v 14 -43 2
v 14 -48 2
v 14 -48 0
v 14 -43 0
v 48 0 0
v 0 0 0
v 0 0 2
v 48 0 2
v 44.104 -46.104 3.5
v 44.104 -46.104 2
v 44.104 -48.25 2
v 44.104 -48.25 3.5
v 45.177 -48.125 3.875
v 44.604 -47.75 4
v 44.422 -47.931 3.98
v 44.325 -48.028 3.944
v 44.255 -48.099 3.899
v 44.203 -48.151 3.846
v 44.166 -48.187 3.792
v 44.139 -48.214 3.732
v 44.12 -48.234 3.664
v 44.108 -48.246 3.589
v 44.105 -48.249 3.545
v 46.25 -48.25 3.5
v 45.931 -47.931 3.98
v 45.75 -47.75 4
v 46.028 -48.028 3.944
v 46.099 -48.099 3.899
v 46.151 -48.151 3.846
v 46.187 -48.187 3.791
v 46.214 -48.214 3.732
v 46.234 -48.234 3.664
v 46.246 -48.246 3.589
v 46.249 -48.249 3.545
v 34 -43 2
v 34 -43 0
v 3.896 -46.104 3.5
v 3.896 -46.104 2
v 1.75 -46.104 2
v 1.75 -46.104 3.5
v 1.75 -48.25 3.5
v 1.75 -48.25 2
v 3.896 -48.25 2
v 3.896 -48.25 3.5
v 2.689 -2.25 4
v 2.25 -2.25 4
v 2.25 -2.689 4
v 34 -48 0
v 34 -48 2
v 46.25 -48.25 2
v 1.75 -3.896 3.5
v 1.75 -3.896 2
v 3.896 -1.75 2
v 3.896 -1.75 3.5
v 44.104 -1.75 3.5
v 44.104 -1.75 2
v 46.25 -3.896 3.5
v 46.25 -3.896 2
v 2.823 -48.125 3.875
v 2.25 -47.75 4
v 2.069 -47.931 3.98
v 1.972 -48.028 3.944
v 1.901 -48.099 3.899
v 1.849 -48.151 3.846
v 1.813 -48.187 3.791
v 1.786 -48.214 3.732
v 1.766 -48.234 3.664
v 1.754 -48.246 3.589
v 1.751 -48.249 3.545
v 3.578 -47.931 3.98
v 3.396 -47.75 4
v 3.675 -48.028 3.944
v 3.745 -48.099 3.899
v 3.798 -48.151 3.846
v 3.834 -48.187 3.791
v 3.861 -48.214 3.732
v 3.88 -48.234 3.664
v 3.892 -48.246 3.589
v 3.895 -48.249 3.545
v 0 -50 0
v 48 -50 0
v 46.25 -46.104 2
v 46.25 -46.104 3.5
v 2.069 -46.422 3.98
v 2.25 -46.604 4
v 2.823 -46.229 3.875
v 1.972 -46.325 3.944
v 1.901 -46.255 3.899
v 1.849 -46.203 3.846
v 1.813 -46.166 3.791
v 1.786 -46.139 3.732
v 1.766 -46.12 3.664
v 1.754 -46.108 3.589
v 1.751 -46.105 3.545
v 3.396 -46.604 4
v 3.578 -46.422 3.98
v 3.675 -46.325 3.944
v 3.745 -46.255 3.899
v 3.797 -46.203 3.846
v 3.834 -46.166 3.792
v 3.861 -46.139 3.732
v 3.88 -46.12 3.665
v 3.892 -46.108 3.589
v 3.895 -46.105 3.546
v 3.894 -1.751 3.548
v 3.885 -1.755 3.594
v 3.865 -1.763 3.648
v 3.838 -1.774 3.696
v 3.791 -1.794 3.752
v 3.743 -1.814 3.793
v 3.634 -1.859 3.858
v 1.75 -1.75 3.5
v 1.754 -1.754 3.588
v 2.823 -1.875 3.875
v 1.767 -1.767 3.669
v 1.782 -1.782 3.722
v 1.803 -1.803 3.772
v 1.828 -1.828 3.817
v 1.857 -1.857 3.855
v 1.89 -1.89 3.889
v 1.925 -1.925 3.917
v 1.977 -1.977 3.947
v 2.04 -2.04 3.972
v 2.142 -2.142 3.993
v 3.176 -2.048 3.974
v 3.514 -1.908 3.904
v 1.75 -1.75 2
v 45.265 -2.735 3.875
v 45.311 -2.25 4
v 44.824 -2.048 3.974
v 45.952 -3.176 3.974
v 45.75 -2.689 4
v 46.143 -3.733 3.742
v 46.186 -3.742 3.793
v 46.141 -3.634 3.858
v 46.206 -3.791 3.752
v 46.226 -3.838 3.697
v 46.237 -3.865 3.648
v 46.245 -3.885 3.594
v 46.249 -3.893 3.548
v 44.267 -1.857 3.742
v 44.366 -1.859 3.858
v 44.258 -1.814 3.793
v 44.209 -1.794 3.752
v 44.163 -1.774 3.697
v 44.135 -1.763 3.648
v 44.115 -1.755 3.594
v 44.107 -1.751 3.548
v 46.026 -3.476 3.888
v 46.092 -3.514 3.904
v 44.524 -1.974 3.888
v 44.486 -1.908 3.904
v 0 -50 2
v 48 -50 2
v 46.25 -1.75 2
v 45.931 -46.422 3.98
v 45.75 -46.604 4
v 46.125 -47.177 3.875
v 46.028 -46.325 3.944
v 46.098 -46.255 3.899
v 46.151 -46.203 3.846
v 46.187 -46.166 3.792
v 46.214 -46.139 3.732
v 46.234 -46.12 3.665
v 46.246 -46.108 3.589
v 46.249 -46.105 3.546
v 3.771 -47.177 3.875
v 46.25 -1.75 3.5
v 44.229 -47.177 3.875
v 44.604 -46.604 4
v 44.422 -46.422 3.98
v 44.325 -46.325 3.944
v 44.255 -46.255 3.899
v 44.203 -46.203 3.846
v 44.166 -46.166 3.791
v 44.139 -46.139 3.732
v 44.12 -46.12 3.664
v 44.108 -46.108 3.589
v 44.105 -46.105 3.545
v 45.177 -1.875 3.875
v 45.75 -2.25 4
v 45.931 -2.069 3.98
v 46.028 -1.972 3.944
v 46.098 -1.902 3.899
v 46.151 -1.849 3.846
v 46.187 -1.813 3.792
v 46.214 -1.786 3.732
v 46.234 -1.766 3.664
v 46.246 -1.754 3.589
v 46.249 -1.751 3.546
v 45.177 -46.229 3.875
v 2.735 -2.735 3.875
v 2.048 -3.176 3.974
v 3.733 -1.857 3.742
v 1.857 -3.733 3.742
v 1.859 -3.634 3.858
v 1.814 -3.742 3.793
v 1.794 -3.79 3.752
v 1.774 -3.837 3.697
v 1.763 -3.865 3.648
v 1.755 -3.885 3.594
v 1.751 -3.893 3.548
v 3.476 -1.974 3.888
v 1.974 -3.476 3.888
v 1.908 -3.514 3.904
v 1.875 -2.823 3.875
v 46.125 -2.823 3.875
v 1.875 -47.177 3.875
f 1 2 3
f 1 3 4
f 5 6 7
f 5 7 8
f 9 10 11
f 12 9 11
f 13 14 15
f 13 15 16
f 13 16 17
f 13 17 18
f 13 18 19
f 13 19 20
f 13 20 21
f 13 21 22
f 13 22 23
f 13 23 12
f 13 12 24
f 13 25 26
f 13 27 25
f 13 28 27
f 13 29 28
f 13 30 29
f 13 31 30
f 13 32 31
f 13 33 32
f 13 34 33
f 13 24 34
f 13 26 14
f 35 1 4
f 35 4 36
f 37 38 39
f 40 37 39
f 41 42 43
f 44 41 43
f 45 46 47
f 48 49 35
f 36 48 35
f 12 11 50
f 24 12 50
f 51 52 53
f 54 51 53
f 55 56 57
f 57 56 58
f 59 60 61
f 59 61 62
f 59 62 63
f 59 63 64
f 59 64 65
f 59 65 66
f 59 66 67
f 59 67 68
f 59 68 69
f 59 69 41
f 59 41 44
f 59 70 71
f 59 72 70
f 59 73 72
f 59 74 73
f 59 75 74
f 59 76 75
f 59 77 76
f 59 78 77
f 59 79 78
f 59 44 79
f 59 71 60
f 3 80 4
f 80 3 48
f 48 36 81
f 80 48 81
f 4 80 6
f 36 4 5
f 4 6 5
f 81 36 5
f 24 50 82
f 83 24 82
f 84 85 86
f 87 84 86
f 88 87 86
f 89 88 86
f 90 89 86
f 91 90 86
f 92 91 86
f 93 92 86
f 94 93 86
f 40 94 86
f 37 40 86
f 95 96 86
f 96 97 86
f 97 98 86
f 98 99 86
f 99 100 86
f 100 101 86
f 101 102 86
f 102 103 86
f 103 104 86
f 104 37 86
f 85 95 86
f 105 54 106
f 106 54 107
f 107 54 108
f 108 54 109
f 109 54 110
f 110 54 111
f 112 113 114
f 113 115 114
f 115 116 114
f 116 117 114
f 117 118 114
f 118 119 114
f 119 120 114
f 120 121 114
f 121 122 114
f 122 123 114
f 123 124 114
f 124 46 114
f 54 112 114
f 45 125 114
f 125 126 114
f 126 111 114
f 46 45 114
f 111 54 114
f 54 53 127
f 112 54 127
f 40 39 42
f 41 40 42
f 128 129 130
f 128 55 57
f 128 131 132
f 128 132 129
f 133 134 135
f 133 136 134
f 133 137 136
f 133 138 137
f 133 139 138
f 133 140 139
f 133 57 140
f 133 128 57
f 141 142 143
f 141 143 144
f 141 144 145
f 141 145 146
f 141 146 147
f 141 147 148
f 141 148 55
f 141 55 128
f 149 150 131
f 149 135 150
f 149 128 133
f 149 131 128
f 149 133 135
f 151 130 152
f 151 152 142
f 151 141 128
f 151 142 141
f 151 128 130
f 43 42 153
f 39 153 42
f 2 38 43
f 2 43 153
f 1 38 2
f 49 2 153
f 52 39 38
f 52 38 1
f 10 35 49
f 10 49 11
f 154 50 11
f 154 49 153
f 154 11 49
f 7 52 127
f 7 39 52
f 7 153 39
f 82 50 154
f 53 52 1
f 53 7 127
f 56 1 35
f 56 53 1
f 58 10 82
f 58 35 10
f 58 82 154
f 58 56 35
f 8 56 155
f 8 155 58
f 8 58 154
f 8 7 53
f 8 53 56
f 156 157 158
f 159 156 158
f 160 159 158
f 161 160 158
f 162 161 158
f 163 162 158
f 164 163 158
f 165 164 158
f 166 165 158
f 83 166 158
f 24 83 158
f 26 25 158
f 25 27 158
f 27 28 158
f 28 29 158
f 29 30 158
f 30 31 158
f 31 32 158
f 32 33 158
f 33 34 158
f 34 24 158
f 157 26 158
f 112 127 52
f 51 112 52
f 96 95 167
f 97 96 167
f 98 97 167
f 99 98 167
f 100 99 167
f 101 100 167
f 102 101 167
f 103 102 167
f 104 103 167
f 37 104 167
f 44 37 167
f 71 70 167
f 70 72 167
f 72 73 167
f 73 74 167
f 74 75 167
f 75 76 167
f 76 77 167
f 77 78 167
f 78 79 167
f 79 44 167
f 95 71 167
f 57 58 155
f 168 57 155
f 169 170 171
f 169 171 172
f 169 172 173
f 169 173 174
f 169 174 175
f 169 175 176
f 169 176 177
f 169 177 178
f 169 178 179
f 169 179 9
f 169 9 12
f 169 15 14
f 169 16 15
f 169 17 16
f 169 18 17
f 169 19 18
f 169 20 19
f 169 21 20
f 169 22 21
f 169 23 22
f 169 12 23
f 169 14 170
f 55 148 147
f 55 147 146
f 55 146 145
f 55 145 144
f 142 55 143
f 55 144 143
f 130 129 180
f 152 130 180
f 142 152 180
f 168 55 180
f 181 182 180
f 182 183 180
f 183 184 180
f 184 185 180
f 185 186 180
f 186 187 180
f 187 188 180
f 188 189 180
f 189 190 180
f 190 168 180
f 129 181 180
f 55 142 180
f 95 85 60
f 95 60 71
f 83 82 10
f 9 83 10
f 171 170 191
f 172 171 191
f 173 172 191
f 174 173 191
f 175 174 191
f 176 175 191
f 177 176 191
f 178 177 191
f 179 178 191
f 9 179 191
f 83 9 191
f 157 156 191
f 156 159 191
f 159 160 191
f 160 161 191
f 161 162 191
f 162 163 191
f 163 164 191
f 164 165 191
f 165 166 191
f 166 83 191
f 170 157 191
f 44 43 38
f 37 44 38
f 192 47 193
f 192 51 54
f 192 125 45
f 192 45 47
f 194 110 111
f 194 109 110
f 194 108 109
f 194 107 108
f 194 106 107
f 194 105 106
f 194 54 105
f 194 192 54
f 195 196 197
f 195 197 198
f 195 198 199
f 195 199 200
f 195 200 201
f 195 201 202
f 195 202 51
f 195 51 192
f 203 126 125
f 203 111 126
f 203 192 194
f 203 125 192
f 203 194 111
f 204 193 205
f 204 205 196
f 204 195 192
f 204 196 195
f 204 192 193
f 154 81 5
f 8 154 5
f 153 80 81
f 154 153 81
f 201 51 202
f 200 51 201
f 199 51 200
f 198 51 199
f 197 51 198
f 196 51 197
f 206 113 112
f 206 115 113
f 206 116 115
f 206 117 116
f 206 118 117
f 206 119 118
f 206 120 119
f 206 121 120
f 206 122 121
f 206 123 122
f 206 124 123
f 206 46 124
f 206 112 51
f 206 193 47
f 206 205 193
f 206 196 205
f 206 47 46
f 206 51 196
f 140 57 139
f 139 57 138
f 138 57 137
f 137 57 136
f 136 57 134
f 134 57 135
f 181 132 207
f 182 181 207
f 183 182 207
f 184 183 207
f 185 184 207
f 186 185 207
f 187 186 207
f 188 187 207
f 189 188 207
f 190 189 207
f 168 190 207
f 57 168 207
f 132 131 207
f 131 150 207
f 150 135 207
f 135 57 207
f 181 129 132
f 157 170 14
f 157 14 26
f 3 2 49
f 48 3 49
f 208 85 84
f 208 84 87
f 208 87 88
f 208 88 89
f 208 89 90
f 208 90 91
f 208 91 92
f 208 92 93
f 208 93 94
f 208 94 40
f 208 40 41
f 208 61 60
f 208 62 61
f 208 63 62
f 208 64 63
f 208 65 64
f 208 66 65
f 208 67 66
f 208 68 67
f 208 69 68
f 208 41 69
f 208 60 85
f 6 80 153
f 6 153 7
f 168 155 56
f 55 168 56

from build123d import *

# Parameters (mm, degrees)
F0_W         = 48
F0_H         = 50
F1_DEPTH     = 2
F3_DEPTH     = 2
F4_W         = 20
F4_H         = 5
F5_DEPTH     = 25
F6_T1_DEPTH  = 4.6464466094
F6_T3_DEPTH  = 4.6464466094
F6_T5_DEPTH  = 4.6464466094
F6_T7_DEPTH  = 5.5355339059
F6_T9_DEPTH  = 5.5355339059
F6_T11_DEPTH = 4.6464466094


# Not quite as in the source:
# - a fillet or chamfer that OpenCascade refuses, or shapes differently, is made with other operations: its cross-section is extruded or revolved along the edge and cut away or added
# - a feature names something its author has since deleted; it is built from what else it names


with BuildPart() as f1:
    # F0 (on Top) → F1 (new body)
    with BuildSketch(Plane.XY):
        with Locations((24, -25)):
            Rectangle(F0_W, F0_H)
    extrude(amount=F1_DEPTH)

    # F2 (on face) → F3 (join)
    with BuildSketch(Plane.XY.offset(2)):
        Polygon((1.75, -1.75), (1.75, -3.8964466094), (3.8964466094, -1.75), align=None)
        Polygon((44.1035533906, -1.75), (46.25, -3.8964466094), (46.25, -1.75), align=None)
        Polygon((46.25, -48.25), (46.25, -46.1035533906), (44.1035533906, -48.25), align=None)
        Polygon((3.8964466094, -48.25), (1.75, -46.1035533906), (1.75, -48.25), align=None)
        Polygon((3.8964466094, -46.1035533906), (1.75, -46.1035533906), (3.8964466094, -48.25), align=None)
        Polygon((44.1035533906, -48.25), (46.25, -46.1035533906), (44.1035533906, -46.1035533906), align=None)
    extrude(amount=F3_DEPTH)

    # F4 (on face) → F5 (cut)
    with BuildSketch(Plane.XY.offset(2)):
        with Locations((24, -45.5)):
            Rectangle(F4_W, F4_H)
    extrude(amount=-F5_DEPTH, mode=Mode.SUBTRACT)

    # F6: fillet of radius 0.5 on 14 edges, made by hand

    # F6_s2 → F6_t1 (cut)
    with BuildSketch(Plane.XZ.offset(44.8535533906)):
        with BuildLine():
            add(Edge.make_bspline(
                [(1.75, 3.5), (1.75, 4), (2.25, 4)],
                knots=[0, 0, 0, 1, 1, 1], degree=2, weights=[1, 1, 1]))
            Line((2.25, 4), (1.75, 4))
            Line((1.75, 4), (1.75, 3.5))
        make_face()
        with BuildLine():
            add(Edge.make_bspline(
                [(3.8964466094, 3.5), (3.8964466094, 4), (3.3964466094, 4)],
                knots=[0, 0, 0, 1, 1, 1], degree=2, weights=[1, 1, 1]))
            Line((3.3964466094, 4), (3.8964466094, 4))
            Line((3.8964466094, 4), (3.8964466094, 3.5))
        make_face()
        with BuildLine():
            add(Edge.make_bspline(
                [(46.25, 3.5), (46.25, 4), (45.75, 4)],
                knots=[0, 0, 0, 1, 1, 1], degree=2, weights=[1, 1, 1]))
            Line((45.75, 4), (46.25, 4))
            Line((46.25, 4), (46.25, 3.5))
        make_face()
        with BuildLine():
            add(Edge.make_bspline(
                [(44.1035533906, 3.5), (44.1035533906, 4), (44.6035533906, 4)],
                knots=[0, 0, 0, 1, 1, 1], degree=2, weights=[1, 1, 1]))
            Line((44.6035533906, 4), (44.1035533906, 4))
            Line((44.1035533906, 4), (44.1035533906, 3.5))
        make_face()
    extrude(amount=F6_T1_DEPTH, mode=Mode.SUBTRACT)

    # F6_s4 → F6_t3 (cut)
    with BuildSketch(Plane.YZ.offset(0.5)):
        with BuildLine():
            add(Edge.make_bspline(
                [(-48.25, 3.5), (-48.25, 4), (-47.75, 4)],
                knots=[0, 0, 0, 1, 1, 1], degree=2, weights=[1, 1, 1]))
            Line((-47.75, 4), (-48.25, 4))
            Line((-48.25, 4), (-48.25, 3.5))
        make_face()
        with BuildLine():
            add(Edge.make_bspline(
                [(-46.1035533906, 3.5), (-46.1035533906, 4), (-46.6035533906, 4)],
                knots=[0, 0, 0, 1, 1, 1], degree=2, weights=[1, 1, 1]))
            Line((-46.6035533906, 4), (-46.1035533906, 4))
            Line((-46.1035533906, 4), (-46.1035533906, 3.5))
        make_face()
        with BuildLine():
            add(Edge.make_bspline(
                [(-1.75, 3.5), (-1.75, 4), (-2.25, 4)],
                knots=[0, 0, 0, 1, 1, 1], degree=2, weights=[1, 1, 1]))
            Line((-2.25, 4), (-1.75, 4))
            Line((-1.75, 4), (-1.75, 3.5))
        make_face()
    extrude(amount=F6_T3_DEPTH, mode=Mode.SUBTRACT)

    # F6_s6 → F6_t5 (cut)
    with BuildSketch(Plane.XZ.offset(0.5)):
        with BuildLine():
            add(Edge.make_bspline(
                [(1.75, 3.5), (1.75, 4), (2.25, 4)],
                knots=[0, 0, 0, 1, 1, 1], degree=2, weights=[1, 1, 1]))
            Line((2.25, 4), (1.75, 4))
            Line((1.75, 4), (1.75, 3.5))
        make_face()
        with BuildLine():
            add(Edge.make_bspline(
                [(46.25, 3.5), (46.25, 4), (45.75, 4)],
                knots=[0, 0, 0, 1, 1, 1], degree=2, weights=[1, 1, 1]))
            Line((45.75, 4), (46.25, 4))
            Line((46.25, 4), (46.25, 3.5))
        make_face()
    extrude(amount=F6_T5_DEPTH, mode=Mode.SUBTRACT)

    # F6_s8 → F6_t7 (cut)
    with BuildSketch(Plane(origin=(-1.9571067812, -1.9571067812, 0), x_dir=(0, 0, 1), z_dir=(0.7071067812, 0.7071067812, 0))):
        with BuildLine():
            add(Edge.make_bspline(
                [(3.5, 3.9926406871), (4, 3.9926406871), (4, 3.4926406871)],
                knots=[0, 0, 0, 1, 1, 1], degree=2, weights=[1, 1, 1]))
            Line((4, 3.4926406871), (4, 3.9926406871))
            Line((4, 3.9926406871), (3.5, 3.9926406871))
        make_face()
    extrude(amount=F6_T7_DEPTH, mode=Mode.SUBTRACT)

    # F6_s10 → F6_t9 (cut)
    with BuildSketch(Plane(origin=(22.0428932188, -22.0428932188, 0), x_dir=(0, 0, 1), z_dir=(0.7071067812, -0.7071067812, 0))):
        with BuildLine():
            add(Edge.make_bspline(
                [(3.5, -29.9484848098), (4, -29.9484848098), (4, -30.4484848098)],
                knots=[0, 0, 0, 1, 1, 1], degree=2, weights=[1, 1, 1]))
            Line((4, -30.4484848098), (4, -29.9484848098))
            Line((4, -29.9484848098), (3.5, -29.9484848098))
        make_face()
    extrude(amount=F6_T9_DEPTH, mode=Mode.SUBTRACT)

    # F6_s12 → F6_t11 (cut)
    with BuildSketch(Plane.YZ.offset(42.8535533906)):
        with BuildLine():
            add(Edge.make_bspline(
                [(-1.75, 3.5), (-1.75, 4), (-2.25, 4)],
                knots=[0, 0, 0, 1, 1, 1], degree=2, weights=[1, 1, 1]))
            Line((-2.25, 4), (-1.75, 4))
            Line((-1.75, 4), (-1.75, 3.5))
        make_face()
        with BuildLine():
            add(Edge.make_bspline(
                [(-46.1035533906, 3.5), (-46.1035533906, 4), (-46.6035533906, 4)],
                knots=[0, 0, 0, 1, 1, 1], degree=2, weights=[1, 1, 1]))
            Line((-46.6035533906, 4), (-46.1035533906, 4))
            Line((-46.1035533906, 4), (-46.1035533906, 3.5))
        make_face()
        with BuildLine():
            add(Edge.make_bspline(
                [(-48.25, 3.5), (-48.25, 4), (-47.75, 4)],
                knots=[0, 0, 0, 1, 1, 1], degree=2, weights=[1, 1, 1]))
            Line((-47.75, 4), (-48.25, 4))
            Line((-48.25, 4), (-48.25, 3.5))
        make_face()
    extrude(amount=F6_T11_DEPTH, mode=Mode.SUBTRACT)


solid = f1.part
